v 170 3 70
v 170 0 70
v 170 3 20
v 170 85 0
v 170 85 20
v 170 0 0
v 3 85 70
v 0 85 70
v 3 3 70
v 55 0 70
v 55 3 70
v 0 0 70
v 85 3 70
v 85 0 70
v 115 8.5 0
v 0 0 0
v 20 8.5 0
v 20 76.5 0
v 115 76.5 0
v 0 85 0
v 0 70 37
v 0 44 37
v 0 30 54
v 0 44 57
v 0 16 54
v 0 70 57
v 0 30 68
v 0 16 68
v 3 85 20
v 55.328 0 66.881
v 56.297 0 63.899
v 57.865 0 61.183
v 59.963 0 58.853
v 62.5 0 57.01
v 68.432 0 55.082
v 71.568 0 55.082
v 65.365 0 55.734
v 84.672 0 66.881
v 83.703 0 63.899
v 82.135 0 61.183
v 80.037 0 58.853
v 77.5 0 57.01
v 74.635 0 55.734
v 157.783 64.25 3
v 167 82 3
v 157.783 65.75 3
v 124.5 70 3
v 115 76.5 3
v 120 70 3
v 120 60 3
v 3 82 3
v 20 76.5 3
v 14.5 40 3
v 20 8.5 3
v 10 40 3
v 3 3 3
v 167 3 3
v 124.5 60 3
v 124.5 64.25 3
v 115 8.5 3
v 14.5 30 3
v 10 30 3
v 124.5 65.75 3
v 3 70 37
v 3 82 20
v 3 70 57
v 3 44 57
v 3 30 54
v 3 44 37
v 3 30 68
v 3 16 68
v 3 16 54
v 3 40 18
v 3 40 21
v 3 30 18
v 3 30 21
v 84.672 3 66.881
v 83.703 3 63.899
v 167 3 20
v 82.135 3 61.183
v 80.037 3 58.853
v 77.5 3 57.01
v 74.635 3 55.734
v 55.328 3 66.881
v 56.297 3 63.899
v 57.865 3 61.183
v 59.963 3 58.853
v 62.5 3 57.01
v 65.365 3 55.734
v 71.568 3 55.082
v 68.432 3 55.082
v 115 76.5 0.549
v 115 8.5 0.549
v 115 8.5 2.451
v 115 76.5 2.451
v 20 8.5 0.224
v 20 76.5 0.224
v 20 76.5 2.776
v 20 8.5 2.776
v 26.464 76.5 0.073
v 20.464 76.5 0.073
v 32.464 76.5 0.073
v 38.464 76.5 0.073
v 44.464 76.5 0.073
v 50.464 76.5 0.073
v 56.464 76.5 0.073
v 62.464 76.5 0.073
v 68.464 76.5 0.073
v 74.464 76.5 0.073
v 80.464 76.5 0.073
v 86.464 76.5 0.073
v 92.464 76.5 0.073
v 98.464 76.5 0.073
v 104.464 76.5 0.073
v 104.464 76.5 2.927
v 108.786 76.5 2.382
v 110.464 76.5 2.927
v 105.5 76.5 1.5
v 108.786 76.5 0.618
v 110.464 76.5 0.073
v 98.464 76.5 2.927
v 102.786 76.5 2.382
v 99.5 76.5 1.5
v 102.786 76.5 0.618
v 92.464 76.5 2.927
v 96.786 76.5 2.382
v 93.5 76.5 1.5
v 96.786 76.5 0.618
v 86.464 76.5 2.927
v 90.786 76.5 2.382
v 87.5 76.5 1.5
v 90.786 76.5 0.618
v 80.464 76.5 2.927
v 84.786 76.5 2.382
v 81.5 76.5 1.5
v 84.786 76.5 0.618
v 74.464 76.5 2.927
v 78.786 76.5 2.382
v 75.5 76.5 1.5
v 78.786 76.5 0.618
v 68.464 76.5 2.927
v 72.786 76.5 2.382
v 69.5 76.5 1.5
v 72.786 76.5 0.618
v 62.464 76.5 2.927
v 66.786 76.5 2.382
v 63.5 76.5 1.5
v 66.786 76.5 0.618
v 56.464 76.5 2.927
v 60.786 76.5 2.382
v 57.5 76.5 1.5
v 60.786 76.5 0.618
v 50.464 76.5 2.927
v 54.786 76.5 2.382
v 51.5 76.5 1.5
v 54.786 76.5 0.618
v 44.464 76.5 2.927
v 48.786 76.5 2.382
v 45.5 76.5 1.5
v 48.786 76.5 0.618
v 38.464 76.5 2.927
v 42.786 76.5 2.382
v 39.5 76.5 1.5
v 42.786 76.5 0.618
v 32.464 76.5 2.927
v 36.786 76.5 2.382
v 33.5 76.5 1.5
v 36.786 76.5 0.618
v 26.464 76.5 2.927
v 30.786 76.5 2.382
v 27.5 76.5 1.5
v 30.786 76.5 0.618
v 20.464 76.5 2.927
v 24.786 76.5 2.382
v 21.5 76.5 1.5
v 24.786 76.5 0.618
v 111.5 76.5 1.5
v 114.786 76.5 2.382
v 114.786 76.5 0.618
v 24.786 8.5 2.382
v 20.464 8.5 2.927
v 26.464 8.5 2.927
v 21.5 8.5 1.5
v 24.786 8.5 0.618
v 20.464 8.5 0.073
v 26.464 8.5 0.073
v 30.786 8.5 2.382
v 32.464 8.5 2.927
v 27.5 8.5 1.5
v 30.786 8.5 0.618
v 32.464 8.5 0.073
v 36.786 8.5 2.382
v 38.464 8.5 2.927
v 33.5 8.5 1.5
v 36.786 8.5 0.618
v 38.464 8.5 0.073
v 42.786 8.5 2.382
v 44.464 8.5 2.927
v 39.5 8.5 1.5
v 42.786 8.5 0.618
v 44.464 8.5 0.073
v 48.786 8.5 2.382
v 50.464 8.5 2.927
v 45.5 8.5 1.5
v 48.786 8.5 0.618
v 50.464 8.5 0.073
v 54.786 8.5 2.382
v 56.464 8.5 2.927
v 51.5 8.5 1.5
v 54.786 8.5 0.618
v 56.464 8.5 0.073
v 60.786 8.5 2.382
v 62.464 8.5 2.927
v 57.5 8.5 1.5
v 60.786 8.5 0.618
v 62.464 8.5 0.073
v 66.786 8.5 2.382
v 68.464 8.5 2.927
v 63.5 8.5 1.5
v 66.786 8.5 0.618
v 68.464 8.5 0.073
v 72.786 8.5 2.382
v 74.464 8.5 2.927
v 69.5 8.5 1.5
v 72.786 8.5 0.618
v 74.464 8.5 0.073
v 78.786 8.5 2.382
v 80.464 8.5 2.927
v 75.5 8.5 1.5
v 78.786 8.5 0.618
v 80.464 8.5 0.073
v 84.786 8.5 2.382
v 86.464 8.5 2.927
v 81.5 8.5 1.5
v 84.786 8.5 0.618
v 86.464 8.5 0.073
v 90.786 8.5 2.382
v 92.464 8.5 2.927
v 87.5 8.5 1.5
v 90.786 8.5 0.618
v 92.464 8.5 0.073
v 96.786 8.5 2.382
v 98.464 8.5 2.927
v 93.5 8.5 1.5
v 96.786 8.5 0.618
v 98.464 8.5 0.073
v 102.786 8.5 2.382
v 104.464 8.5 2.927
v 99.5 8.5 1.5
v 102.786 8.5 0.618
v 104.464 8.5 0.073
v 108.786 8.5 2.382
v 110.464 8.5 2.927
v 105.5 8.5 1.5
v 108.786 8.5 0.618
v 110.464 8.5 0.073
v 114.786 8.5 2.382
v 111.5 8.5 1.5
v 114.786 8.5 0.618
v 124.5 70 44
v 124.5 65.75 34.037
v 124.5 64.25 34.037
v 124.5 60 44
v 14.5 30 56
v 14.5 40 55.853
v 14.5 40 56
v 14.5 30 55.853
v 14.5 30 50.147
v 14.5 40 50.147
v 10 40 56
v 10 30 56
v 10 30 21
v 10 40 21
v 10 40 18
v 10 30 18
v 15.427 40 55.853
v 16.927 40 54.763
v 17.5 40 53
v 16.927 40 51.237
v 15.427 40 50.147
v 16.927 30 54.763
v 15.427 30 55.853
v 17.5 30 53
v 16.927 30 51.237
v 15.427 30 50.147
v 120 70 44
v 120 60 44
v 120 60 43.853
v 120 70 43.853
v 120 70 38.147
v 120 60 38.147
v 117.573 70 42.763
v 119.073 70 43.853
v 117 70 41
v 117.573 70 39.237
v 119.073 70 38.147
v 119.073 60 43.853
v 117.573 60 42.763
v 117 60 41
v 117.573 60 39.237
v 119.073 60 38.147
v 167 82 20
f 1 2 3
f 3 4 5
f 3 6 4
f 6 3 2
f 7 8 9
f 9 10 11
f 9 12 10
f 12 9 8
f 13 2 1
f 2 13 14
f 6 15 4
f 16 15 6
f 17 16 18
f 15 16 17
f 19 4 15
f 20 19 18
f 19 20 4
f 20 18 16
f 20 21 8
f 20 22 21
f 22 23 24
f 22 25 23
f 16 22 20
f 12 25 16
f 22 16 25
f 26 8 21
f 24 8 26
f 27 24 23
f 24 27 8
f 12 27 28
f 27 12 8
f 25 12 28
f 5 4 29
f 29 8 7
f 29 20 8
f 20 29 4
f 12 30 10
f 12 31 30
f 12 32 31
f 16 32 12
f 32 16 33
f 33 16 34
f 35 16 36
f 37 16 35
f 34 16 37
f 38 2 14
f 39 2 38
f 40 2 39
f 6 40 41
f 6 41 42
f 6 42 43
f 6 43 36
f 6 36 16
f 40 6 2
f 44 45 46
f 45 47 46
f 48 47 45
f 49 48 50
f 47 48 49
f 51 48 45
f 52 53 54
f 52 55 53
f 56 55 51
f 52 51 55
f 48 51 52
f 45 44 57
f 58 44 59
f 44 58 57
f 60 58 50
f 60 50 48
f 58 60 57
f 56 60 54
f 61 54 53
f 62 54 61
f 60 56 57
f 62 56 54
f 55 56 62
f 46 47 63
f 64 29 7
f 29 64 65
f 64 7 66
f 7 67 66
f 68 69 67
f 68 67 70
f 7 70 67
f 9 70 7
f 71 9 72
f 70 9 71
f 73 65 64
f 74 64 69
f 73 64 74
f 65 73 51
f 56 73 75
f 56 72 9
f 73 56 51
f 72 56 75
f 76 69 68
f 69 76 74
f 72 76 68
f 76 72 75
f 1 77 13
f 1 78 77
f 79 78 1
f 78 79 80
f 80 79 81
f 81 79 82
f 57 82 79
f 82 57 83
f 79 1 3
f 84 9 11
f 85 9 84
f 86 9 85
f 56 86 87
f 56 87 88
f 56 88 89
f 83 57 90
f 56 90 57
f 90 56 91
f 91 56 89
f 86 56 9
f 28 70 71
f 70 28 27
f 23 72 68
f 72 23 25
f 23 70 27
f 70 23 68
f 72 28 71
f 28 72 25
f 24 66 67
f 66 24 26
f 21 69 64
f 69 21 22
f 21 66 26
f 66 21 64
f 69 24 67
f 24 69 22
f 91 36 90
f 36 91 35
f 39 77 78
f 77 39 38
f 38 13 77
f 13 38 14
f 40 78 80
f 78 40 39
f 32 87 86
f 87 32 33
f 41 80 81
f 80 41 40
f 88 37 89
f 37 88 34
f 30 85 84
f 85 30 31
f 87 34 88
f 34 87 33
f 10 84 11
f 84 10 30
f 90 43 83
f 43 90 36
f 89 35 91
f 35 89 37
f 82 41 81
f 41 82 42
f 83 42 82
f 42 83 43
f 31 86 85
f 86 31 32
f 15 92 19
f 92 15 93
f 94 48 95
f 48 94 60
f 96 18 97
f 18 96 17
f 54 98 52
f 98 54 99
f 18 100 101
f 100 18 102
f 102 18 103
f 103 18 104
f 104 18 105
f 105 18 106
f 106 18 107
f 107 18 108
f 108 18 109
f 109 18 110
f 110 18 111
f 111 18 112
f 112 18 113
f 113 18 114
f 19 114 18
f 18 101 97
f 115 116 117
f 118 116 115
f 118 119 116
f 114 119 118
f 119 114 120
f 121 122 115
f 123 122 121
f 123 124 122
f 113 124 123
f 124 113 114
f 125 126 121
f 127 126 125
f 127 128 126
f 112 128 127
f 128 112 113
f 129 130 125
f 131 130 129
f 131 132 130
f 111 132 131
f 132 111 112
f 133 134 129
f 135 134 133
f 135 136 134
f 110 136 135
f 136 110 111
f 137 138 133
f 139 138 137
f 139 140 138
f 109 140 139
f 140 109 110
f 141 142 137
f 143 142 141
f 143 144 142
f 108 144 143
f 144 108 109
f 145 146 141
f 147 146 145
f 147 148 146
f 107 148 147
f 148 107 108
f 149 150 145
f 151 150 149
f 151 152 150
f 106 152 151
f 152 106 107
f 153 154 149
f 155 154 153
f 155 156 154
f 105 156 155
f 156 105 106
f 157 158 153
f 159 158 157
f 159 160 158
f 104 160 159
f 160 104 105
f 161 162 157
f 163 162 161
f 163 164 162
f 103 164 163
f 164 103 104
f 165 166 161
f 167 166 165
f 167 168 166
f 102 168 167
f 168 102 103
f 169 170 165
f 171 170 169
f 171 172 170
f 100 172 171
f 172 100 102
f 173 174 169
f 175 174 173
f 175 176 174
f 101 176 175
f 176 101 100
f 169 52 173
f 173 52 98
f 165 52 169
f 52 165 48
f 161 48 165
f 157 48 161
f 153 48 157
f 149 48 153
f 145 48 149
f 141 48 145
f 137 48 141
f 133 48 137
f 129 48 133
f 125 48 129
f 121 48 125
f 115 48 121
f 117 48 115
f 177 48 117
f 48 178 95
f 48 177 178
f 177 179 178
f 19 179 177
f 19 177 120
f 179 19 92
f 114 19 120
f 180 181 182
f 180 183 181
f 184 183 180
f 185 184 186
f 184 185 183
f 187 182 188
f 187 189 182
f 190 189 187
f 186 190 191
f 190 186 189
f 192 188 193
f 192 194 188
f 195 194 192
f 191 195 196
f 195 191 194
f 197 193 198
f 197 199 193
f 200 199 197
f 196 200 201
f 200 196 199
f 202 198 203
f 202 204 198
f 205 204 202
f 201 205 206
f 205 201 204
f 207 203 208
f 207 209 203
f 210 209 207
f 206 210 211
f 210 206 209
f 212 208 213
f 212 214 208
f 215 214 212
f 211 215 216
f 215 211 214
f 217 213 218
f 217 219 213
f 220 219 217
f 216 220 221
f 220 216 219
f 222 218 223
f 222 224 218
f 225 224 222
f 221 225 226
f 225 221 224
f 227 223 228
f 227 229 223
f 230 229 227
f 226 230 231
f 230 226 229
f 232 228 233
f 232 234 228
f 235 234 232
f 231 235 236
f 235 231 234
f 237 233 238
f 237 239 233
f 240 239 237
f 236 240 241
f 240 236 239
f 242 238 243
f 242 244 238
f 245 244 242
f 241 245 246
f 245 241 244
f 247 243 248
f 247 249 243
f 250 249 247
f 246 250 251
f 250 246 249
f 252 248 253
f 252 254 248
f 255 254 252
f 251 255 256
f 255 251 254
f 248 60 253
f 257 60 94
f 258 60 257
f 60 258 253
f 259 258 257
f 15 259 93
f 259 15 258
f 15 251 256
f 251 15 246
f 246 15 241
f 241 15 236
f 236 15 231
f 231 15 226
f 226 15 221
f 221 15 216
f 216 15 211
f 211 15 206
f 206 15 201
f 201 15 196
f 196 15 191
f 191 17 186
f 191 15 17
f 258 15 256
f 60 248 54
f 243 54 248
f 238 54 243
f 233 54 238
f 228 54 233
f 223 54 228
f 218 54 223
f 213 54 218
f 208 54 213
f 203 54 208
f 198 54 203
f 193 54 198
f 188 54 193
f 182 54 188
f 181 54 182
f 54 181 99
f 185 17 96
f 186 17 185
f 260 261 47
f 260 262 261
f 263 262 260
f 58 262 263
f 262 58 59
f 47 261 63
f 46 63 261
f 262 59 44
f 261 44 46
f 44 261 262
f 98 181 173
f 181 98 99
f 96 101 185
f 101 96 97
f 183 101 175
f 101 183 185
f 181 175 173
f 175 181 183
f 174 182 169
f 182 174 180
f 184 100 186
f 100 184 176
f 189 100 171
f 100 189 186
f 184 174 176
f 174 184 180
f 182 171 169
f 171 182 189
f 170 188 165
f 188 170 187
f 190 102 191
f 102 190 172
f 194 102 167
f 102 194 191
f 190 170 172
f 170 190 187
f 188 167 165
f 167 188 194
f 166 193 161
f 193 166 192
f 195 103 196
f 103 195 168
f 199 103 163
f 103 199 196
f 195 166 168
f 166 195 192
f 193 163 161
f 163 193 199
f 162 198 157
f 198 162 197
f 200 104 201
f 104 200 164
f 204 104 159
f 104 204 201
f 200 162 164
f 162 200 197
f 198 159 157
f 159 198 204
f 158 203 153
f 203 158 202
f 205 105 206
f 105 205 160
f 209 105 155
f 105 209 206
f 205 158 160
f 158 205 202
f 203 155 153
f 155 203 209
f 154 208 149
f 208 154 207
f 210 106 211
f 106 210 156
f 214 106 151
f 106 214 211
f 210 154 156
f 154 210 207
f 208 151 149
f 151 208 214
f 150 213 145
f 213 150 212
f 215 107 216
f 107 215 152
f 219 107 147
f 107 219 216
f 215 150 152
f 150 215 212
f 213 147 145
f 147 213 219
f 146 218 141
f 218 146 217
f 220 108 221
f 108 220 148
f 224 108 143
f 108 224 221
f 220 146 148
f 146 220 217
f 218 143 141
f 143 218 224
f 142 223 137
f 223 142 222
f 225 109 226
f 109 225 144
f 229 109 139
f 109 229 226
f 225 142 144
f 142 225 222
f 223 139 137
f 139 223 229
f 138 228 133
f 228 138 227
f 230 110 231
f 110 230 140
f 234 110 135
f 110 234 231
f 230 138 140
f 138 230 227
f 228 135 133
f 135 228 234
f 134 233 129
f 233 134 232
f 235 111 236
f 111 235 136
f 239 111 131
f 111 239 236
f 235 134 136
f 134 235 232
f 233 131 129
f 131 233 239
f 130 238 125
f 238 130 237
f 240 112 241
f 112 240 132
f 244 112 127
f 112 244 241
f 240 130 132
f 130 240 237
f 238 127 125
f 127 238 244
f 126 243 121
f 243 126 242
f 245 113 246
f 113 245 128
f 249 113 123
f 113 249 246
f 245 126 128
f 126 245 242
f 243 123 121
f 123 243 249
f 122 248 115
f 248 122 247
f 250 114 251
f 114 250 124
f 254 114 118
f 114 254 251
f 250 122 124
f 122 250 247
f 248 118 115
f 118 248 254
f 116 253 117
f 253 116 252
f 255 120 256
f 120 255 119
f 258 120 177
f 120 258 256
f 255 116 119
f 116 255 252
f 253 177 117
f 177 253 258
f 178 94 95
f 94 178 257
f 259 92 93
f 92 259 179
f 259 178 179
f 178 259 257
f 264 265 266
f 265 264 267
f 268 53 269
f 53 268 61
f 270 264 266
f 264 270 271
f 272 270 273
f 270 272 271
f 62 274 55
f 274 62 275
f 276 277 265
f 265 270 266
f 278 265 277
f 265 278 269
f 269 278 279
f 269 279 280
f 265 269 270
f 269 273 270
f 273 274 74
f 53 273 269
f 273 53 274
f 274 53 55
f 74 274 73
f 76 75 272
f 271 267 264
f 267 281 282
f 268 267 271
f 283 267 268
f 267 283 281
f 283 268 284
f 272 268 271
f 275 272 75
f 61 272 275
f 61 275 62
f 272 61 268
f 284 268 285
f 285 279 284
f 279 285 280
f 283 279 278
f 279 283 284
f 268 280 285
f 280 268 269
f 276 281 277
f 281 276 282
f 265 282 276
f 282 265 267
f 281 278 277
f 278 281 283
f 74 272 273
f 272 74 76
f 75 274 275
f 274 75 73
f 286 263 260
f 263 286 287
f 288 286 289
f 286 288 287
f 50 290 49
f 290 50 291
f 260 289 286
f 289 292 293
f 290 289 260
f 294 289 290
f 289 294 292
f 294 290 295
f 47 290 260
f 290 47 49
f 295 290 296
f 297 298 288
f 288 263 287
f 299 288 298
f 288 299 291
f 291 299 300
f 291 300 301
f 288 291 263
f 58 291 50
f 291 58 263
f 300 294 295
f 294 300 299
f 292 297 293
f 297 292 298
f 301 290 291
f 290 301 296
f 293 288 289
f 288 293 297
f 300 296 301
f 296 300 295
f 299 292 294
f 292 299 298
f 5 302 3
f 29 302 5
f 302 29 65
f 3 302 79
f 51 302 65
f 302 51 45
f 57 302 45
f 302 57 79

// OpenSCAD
thickness = 3;
height = 170;
width = 85;
length = 70;

sideProtectionHeight = 20;

usbHoleSize = 14;
usbSideDistance = 16;
usbHeight = length - usbHoleSize - 2;

powerLength = 20;
powerWidth = 26;
powerOppositeSideDistance = width - powerWidth - 15;
powerLengthDistance = length - powerLength - 13;

cablesRadius = 15;
cablesHeightDistance = 70;

fixationUpperDistance = 10;
fixationLengthDistance = usbHoleSize+usbSideDistance;
fixationWidth = 10;
fixationHeight = length - 14;
fixationThickness = thickness * 1.5;
fixationSupportStep = 15;

fixationBottomUpperDistance = fixationUpperDistance + 110;
fixationBottomLengthDistance = powerOppositeSideDistance+powerWidth-fixationWidth;
fixationBottomHeight = length - 26;
fixationBottomSupportHeight = fixationBottomHeight * .8;
fixationBottomSupportLength = height - fixationThickness*3 - fixationBottomUpperDistance;
fixationBottomSupportAngle = 313;


ventilationHoleHeight = 95;
ventilationHoleWidth = width * .8;
ventilationHoleHeightDistance = fixationUpperDistance + 10;
ventilationHoleWidthDistance = width * .1;

ventilationStep = 3;

union() {
	//Main box
	difference() {
		cube([height, width, length]);
		translate([thickness,thickness,thickness])
			cube([height+thickness, width+thickness, length+thickness]);

		//USB hole
		translate([0, usbSideDistance, usbHeight])
			cube([thickness*2, usbHoleSize, usbHoleSize	]);

		//Power Source hole
		translate([0, powerOppositeSideDistance, powerLengthDistance])
			cube([thickness*2, powerWidth, powerLength]);

		//Cables hole
		translate([cablesHeightDistance, 0, length])
			rotate([270,0,0])
				cylinder(h = thickness*2, r = cablesRadius);

		//Ventilation hole
		translate([ventilationHoleHeightDistance, ventilationHoleWidthDistance, 0])
			cube([ventilationHoleHeight, ventilationHoleWidth, thickness*2]);


	}
	
	//Upper fixation
	translate([fixationUpperDistance, fixationLengthDistance, 0])
		cube([fixationThickness, fixationWidth, fixationHeight]);
	translate([fixationUpperDistance+fixationThickness, fixationLengthDistance, fixationHeight-thickness])
		rotate([270,0,0])
			cylinder(h = fixationWidth, r = thickness);	
	for (stepSupport = [thickness+fixationSupportStep:fixationSupportStep:fixationHeight-fixationSupportStep*2]) 		{
			translate([thickness, fixationLengthDistance, stepSupport])
				cube([fixationUpperDistance, fixationWidth, thickness]);		
	}
	
	//Bottom fixation
	translate([fixationBottomUpperDistance, fixationBottomLengthDistance, 0])
		cube([fixationThickness, fixationWidth, fixationBottomHeight]);
	translate([fixationBottomUpperDistance, fixationBottomLengthDistance, fixationBottomHeight-thickness])
		rotate([270,0,0])
			cylinder(h = fixationWidth, r = thickness);	
	difference() {
		translate([fixationBottomUpperDistance+fixationThickness, fixationBottomLengthDistance+(fixationWidth/2-thickness/4), 0])
			cube([fixationBottomSupportLength, thickness/2, fixationBottomSupportHeight]);

		translate([fixationBottomUpperDistance+fixationThickness+fixationBottomSupportLength, fixationBottomLengthDistance+(fixationWidth/2-thickness/2), 0])
			rotate([0, fixationBottomSupportAngle, 0])
				cube([fixationBottomSupportLength, fixationThickness, fixationBottomSupportHeight*2]);
	}
	

	//Side Protection
	translate([0, width-thickness, 0])
		cube([height, thickness, sideProtectionHeight]);
	
	//Bottom Protection
	translate([height-thickness, 0, 0])
		cube([thickness, width, sideProtectionHeight]);

	//Ventilation grid
	for (step = [fixationUpperDistance:ventilationStep:ventilationHoleHeightDistance+ventilationHoleHeight]) 		{
		if ((step%2) == 0) {
			translate([fixationUpperDistance+step, ventilationHoleWidthDistance, thickness/2])
				rotate([270,0,0])
					cylinder(h = ventilationHoleWidth, r = thickness/2);		
		}
	}


}
